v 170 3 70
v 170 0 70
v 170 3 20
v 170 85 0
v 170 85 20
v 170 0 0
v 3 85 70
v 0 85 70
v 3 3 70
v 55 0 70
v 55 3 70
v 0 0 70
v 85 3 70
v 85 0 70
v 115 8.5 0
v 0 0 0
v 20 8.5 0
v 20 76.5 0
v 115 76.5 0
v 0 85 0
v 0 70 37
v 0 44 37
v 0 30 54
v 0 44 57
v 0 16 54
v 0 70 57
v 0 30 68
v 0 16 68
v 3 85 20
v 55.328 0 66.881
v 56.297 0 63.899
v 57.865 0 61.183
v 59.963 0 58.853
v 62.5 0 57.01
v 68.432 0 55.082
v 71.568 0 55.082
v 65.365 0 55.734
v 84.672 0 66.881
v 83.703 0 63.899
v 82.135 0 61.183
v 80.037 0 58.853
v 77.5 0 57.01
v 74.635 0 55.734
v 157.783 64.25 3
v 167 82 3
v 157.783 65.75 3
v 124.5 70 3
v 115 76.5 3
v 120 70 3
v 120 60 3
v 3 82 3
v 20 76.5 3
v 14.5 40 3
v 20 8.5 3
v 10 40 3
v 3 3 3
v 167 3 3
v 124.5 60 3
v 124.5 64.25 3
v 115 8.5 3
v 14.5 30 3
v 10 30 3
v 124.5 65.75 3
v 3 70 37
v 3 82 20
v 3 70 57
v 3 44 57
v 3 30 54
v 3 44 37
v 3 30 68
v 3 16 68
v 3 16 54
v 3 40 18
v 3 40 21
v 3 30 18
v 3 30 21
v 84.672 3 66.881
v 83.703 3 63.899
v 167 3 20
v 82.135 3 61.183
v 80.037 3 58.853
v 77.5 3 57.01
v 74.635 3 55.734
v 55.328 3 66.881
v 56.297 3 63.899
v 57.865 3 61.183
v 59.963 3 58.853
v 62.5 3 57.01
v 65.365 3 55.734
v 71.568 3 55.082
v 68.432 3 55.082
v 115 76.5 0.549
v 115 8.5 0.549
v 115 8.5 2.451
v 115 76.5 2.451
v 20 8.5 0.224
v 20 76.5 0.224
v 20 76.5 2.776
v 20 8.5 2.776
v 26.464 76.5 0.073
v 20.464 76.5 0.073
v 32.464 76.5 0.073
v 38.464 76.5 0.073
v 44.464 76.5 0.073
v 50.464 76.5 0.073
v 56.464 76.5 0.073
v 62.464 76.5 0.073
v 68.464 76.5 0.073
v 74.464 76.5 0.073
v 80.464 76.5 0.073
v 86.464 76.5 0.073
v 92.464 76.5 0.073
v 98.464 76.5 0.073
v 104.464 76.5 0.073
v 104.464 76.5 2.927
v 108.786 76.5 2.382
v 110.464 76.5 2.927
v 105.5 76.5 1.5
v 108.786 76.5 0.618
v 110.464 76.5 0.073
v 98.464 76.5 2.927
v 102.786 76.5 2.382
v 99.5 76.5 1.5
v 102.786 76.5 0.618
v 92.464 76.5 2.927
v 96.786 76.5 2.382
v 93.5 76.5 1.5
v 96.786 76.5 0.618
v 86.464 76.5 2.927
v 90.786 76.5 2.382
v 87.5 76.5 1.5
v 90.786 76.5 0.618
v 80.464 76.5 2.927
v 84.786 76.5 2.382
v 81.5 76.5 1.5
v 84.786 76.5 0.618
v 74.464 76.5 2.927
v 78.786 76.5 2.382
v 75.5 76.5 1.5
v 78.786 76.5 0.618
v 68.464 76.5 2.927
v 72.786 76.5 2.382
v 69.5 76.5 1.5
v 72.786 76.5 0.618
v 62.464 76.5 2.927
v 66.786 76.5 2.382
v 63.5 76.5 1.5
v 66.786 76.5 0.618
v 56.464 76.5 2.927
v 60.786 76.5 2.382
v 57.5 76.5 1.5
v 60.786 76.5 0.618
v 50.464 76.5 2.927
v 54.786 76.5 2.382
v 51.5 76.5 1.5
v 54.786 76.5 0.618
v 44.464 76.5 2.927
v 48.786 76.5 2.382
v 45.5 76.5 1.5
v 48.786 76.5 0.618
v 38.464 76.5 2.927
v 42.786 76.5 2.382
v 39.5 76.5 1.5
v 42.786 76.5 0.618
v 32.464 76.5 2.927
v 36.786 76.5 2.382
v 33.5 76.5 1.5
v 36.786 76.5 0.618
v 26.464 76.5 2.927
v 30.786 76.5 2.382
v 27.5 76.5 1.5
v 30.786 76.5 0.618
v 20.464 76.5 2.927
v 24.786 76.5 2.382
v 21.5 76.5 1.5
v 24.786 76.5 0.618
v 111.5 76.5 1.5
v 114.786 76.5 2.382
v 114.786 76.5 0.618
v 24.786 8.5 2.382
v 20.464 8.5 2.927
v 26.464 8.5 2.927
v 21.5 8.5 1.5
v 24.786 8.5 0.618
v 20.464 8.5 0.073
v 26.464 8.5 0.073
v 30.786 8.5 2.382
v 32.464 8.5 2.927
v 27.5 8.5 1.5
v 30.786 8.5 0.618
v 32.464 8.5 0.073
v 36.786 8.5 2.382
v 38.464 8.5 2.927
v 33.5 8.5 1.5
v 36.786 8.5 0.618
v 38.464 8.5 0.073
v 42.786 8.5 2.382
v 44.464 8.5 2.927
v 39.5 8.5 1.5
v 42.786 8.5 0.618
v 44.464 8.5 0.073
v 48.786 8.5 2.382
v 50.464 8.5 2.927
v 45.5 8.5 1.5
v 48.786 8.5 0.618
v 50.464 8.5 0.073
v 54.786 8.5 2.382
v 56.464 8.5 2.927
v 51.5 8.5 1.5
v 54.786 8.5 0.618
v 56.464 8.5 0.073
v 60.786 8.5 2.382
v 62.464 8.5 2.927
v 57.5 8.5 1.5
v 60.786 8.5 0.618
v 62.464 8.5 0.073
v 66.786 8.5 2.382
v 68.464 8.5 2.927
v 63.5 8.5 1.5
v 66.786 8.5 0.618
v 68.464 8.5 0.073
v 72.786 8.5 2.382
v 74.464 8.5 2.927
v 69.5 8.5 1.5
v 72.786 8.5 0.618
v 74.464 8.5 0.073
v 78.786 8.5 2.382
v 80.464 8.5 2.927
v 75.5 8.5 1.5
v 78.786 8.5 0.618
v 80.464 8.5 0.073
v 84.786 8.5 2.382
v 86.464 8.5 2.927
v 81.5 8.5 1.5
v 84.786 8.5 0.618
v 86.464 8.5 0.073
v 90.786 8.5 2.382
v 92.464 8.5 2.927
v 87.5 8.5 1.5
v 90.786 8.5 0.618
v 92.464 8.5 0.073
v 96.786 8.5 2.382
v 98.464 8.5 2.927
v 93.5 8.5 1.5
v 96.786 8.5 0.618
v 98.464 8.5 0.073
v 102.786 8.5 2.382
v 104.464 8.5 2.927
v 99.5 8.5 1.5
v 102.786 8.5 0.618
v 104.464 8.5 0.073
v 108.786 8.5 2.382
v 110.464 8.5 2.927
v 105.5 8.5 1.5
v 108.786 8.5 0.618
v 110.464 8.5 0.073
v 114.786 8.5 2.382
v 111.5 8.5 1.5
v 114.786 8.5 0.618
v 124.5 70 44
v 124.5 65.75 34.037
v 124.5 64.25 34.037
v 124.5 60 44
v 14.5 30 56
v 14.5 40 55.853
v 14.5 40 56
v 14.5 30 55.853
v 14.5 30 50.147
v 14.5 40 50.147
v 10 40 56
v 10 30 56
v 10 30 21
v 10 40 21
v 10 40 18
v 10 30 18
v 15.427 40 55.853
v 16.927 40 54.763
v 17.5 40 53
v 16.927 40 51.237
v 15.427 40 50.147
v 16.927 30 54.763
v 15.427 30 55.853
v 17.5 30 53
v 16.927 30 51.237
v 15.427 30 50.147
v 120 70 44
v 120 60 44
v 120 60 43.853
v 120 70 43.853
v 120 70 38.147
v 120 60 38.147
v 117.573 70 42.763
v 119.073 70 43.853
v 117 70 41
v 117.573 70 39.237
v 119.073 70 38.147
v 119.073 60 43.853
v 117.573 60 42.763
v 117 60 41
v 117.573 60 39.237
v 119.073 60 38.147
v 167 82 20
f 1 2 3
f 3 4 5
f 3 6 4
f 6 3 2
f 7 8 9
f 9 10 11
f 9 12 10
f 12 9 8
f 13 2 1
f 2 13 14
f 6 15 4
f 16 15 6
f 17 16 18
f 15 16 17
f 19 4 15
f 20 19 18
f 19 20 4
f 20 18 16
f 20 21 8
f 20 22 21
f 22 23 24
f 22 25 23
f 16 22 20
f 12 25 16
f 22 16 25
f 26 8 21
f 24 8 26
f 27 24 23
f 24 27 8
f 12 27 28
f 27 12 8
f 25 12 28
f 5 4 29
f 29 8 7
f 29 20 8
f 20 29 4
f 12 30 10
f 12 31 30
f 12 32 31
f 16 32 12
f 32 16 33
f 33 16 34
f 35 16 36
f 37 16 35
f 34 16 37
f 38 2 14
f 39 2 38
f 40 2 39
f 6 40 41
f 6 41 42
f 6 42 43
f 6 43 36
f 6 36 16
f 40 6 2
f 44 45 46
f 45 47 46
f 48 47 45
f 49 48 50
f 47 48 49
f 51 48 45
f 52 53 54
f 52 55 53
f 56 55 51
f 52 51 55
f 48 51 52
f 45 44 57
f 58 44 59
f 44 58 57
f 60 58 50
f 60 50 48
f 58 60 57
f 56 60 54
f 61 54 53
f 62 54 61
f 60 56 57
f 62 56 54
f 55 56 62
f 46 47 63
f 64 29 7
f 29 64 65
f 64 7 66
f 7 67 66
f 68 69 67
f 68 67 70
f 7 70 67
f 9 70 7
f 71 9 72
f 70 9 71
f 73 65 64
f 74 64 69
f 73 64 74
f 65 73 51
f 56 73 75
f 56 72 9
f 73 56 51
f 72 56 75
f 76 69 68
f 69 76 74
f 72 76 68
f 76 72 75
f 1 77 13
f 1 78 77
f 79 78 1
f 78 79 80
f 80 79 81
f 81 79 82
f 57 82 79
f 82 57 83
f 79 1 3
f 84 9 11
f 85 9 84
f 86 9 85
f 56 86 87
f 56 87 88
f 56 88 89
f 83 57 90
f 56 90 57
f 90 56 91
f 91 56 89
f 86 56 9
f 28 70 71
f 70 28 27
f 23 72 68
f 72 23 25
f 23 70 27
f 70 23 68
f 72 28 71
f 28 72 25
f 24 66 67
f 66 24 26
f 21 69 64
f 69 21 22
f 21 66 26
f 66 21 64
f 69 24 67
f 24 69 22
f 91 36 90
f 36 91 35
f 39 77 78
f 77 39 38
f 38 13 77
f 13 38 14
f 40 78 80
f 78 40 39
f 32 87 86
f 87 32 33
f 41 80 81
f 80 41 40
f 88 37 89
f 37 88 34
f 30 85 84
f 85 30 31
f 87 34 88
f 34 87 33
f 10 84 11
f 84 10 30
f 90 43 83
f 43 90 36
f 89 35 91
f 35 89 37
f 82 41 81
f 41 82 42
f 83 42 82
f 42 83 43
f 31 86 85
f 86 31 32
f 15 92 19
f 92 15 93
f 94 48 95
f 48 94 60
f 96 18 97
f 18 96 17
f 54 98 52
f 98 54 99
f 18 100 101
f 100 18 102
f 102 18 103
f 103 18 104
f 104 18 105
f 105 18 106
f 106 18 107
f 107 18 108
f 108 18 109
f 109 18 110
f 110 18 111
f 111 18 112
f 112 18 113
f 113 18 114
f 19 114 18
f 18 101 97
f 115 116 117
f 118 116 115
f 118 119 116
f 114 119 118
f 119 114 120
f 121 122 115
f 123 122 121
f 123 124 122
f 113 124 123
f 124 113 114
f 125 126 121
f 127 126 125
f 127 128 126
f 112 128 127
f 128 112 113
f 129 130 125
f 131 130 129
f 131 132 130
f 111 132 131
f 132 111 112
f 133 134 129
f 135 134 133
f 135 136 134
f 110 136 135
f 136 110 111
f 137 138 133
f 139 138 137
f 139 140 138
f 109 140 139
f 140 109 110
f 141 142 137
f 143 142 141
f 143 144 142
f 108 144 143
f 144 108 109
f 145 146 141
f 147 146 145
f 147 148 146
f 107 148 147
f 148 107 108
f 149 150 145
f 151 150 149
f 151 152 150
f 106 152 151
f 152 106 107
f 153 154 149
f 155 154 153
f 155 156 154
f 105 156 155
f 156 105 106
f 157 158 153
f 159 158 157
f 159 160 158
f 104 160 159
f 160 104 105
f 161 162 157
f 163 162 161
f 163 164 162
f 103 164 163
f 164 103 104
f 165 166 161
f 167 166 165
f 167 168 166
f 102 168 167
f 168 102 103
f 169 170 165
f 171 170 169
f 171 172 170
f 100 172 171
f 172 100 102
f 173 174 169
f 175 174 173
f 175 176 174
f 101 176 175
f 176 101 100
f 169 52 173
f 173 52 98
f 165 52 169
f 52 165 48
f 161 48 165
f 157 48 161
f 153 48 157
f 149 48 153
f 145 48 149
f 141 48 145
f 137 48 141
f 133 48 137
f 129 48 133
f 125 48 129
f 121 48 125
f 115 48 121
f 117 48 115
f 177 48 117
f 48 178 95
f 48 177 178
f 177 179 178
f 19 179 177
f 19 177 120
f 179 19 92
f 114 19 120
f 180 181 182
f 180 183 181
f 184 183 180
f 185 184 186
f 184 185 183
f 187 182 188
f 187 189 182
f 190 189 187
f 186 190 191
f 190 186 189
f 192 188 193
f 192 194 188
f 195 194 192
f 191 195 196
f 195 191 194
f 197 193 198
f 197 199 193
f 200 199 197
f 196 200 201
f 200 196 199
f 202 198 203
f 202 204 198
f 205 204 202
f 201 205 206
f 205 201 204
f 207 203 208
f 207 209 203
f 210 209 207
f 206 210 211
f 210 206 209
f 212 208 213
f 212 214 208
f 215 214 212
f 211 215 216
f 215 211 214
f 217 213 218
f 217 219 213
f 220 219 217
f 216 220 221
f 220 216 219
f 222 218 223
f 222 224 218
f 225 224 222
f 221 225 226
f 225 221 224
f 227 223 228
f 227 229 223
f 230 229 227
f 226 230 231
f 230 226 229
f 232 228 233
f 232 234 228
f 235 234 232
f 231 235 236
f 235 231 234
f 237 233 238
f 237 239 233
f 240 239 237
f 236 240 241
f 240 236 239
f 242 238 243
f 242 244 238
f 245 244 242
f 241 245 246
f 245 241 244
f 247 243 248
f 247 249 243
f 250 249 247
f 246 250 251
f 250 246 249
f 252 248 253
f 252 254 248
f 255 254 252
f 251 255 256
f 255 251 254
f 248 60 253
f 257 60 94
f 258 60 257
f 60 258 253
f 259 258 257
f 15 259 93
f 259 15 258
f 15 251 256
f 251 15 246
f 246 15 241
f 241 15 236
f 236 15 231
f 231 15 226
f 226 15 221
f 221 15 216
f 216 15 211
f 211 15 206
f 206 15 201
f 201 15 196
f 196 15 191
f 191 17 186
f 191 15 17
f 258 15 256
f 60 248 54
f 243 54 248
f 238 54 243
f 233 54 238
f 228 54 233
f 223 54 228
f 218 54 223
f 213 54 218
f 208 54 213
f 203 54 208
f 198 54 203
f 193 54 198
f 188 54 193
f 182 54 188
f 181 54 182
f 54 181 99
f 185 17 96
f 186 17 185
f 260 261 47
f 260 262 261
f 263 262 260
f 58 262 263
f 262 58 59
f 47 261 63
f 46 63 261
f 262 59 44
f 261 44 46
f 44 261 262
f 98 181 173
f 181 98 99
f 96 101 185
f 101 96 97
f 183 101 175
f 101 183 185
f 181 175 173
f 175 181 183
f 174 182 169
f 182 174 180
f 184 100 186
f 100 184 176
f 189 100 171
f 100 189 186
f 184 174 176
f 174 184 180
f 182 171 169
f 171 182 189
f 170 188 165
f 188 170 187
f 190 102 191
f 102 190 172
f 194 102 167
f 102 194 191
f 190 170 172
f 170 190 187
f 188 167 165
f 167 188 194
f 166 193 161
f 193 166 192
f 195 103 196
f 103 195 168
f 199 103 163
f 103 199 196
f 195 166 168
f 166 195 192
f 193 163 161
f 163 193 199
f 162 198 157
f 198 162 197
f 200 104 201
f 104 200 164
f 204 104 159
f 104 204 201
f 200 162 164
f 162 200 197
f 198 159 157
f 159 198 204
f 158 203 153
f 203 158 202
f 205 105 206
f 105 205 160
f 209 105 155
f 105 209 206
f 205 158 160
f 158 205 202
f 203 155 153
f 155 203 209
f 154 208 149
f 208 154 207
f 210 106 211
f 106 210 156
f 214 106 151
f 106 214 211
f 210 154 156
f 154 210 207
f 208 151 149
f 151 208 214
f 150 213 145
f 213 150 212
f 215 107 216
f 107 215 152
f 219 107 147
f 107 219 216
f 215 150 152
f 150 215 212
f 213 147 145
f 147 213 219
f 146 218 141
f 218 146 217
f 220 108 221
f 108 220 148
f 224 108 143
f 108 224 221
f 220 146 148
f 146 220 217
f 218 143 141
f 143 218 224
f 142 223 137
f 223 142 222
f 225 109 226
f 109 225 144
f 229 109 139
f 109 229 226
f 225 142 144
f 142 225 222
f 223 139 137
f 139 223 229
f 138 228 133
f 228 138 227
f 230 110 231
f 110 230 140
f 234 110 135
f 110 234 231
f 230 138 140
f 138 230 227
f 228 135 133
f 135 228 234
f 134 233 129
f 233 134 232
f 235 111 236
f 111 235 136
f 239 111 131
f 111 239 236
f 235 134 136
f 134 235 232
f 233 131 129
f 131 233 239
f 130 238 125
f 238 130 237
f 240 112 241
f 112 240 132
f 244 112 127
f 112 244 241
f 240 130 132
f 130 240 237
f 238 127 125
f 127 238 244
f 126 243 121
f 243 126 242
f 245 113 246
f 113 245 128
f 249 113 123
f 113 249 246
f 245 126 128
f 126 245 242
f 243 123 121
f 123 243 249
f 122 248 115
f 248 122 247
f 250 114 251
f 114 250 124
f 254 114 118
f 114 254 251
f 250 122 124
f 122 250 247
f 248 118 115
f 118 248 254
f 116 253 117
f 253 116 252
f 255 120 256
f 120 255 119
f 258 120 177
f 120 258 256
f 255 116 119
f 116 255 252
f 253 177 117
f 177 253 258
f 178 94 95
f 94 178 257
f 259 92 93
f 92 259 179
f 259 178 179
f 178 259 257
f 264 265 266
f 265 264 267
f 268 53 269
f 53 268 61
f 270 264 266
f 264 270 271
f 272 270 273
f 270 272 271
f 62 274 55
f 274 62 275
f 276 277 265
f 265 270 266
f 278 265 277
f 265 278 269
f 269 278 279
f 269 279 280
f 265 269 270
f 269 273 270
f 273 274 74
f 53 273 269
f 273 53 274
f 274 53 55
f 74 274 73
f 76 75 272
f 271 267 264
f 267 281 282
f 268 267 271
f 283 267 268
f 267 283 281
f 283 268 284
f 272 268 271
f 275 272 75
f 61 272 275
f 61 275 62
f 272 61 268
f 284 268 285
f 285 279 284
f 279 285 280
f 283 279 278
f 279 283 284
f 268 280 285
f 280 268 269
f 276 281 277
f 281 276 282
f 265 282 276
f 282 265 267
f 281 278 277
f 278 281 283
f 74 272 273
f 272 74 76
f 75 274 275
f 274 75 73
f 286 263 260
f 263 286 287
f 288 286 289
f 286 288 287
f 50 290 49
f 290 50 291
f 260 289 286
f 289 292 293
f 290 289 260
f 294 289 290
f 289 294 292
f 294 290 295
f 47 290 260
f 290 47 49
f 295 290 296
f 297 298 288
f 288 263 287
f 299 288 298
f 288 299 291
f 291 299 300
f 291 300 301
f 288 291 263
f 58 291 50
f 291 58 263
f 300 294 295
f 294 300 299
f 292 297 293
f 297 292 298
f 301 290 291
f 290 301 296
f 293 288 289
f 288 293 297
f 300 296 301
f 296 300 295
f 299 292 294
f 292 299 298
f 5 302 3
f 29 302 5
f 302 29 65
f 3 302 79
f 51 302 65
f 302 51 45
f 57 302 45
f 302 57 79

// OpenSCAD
thickness = 3;
height = 170;
width = 85;
length = 70;

sideProtectionHeight = 20;

usbHoleSize = 14;
usbSideDistance = 16;
usbHeight = length - usbHoleSize - 2;

powerLength = 20;
powerWidth = 26;
powerOppositeSideDistance = width - powerWidth - 15;
powerLengthDistance = length - powerLength - 13;

cablesRadius = 15;
cablesHeightDistance = 70;

fixationUpperDistance = 10;
fixationLengthDistance = usbHoleSize+usbSideDistance;
fixationWidth = 10;
fixationHeight = length - 14;
fixationThickness = thickness * 1.5;
fixationSupportStep = 15;

fixationBottomUpperDistance = fixationUpperDistance + 110;
fixationBottomLengthDistance = powerOppositeSideDistance+powerWidth-fixationWidth;
fixationBottomHeight = length - 26;
fixationBottomSupportHeight = fixationBottomHeight * .8;
fixationBottomSupportLength = height - fixationThickness*3 - fixationBottomUpperDistance;
fixationBottomSupportAngle = 313;


ventilationHoleHeight = 95;
ventilationHoleWidth = width * .8;
ventilationHoleHeightDistance = fixationUpperDistance + 10;
ventilationHoleWidthDistance = width * .1;

ventilationStep = 3;

union() {
	//Main box
	difference() {
		cube([height, width, length]);
		translate([thickness,thickness,thickness])
			cube([height+thickness, width+thickness, length+thickness]);

		//USB hole
		translate([0, usbSideDistance, usbHeight])
			cube([thickness*2, usbHoleSize, usbHoleSize	]);

		//Power Source hole
		translate([0, powerOppositeSideDistance, powerLengthDistance])
			cube([thickness*2, powerWidth, powerLength]);

		//Cables hole
		translate([cablesHeightDistance, 0, length])
			rotate([270,0,0])
				cylinder(h = thickness*2, r = cablesRadius);

		//Ventilation hole
		translate([ventilationHoleHeightDistance, ventilationHoleWidthDistance, 0])
			cube([ventilationHoleHeight, ventilationHoleWidth, thickness*2]);


	}
	
	//Upper fixation
	translate([fixationUpperDistance, fixationLengthDistance, 0])
		cube([fixationThickness, fixationWidth, fixationHeight]);
	translate([fixationUpperDistance+fixationThickness, fixationLengthDistance, fixationHeight-thickness])
		rotate([270,0,0])
			cylinder(h = fixationWidth, r = thickness);	
	for (stepSupport = [thickness+fixationSupportStep:fixationSupportStep:fixationHeight-fixationSupportStep*2]) 		{
			translate([thickness, fixationLengthDistance, stepSupport])
				cube([fixationUpperDistance, fixationWidth, thickness]);		
	}
	
	//Bottom fixation
	translate([fixationBottomUpperDistance, fixationBottomLengthDistance, 0])
		cube([fixationThickness, fixationWidth, fixationBottomHeight]);
	translate([fixationBottomUpperDistance, fixationBottomLengthDistance, fixationBottomHeight-thickness])
		rotate([270,0,0])
			cylinder(h = fixationWidth, r = thickness);	
	difference() {
		translate([fixationBottomUpperDistance+fixationThickness, fixationBottomLengthDistance+(fixationWidth/2-thickness/4), 0])
			cube([fixationBottomSupportLength, thickness/2, fixationBottomSupportHeight]);

		translate([fixationBottomUpperDistance+fixationThickness+fixationBottomSupportLength, fixationBottomLengthDistance+(fixationWidth/2-thickness/2), 0])
			rotate([0, fixationBottomSupportAngle, 0])
				cube([fixationBottomSupportLength, fixationThickness, fixationBottomSupportHeight*2]);
	}
	

	//Side Protection
	translate([0, width-thickness, 0])
		cube([height, thickness, sideProtectionHeight]);
	
	//Bottom Protection
	translate([height-thickness, 0, 0])
		cube([thickness, width, sideProtectionHeight]);

	//Ventilation grid
	for (step = [fixationUpperDistance:ventilationStep:ventilationHoleHeightDistance+ventilationHoleHeight]) 		{
		if ((step%2) == 0) {
			translate([fixationUpperDistance+step, ventilationHoleWidthDistance, thickness/2])
				rotate([270,0,0])
					cylinder(h = ventilationHoleWidth, r = thickness/2);		
		}
	}


}
